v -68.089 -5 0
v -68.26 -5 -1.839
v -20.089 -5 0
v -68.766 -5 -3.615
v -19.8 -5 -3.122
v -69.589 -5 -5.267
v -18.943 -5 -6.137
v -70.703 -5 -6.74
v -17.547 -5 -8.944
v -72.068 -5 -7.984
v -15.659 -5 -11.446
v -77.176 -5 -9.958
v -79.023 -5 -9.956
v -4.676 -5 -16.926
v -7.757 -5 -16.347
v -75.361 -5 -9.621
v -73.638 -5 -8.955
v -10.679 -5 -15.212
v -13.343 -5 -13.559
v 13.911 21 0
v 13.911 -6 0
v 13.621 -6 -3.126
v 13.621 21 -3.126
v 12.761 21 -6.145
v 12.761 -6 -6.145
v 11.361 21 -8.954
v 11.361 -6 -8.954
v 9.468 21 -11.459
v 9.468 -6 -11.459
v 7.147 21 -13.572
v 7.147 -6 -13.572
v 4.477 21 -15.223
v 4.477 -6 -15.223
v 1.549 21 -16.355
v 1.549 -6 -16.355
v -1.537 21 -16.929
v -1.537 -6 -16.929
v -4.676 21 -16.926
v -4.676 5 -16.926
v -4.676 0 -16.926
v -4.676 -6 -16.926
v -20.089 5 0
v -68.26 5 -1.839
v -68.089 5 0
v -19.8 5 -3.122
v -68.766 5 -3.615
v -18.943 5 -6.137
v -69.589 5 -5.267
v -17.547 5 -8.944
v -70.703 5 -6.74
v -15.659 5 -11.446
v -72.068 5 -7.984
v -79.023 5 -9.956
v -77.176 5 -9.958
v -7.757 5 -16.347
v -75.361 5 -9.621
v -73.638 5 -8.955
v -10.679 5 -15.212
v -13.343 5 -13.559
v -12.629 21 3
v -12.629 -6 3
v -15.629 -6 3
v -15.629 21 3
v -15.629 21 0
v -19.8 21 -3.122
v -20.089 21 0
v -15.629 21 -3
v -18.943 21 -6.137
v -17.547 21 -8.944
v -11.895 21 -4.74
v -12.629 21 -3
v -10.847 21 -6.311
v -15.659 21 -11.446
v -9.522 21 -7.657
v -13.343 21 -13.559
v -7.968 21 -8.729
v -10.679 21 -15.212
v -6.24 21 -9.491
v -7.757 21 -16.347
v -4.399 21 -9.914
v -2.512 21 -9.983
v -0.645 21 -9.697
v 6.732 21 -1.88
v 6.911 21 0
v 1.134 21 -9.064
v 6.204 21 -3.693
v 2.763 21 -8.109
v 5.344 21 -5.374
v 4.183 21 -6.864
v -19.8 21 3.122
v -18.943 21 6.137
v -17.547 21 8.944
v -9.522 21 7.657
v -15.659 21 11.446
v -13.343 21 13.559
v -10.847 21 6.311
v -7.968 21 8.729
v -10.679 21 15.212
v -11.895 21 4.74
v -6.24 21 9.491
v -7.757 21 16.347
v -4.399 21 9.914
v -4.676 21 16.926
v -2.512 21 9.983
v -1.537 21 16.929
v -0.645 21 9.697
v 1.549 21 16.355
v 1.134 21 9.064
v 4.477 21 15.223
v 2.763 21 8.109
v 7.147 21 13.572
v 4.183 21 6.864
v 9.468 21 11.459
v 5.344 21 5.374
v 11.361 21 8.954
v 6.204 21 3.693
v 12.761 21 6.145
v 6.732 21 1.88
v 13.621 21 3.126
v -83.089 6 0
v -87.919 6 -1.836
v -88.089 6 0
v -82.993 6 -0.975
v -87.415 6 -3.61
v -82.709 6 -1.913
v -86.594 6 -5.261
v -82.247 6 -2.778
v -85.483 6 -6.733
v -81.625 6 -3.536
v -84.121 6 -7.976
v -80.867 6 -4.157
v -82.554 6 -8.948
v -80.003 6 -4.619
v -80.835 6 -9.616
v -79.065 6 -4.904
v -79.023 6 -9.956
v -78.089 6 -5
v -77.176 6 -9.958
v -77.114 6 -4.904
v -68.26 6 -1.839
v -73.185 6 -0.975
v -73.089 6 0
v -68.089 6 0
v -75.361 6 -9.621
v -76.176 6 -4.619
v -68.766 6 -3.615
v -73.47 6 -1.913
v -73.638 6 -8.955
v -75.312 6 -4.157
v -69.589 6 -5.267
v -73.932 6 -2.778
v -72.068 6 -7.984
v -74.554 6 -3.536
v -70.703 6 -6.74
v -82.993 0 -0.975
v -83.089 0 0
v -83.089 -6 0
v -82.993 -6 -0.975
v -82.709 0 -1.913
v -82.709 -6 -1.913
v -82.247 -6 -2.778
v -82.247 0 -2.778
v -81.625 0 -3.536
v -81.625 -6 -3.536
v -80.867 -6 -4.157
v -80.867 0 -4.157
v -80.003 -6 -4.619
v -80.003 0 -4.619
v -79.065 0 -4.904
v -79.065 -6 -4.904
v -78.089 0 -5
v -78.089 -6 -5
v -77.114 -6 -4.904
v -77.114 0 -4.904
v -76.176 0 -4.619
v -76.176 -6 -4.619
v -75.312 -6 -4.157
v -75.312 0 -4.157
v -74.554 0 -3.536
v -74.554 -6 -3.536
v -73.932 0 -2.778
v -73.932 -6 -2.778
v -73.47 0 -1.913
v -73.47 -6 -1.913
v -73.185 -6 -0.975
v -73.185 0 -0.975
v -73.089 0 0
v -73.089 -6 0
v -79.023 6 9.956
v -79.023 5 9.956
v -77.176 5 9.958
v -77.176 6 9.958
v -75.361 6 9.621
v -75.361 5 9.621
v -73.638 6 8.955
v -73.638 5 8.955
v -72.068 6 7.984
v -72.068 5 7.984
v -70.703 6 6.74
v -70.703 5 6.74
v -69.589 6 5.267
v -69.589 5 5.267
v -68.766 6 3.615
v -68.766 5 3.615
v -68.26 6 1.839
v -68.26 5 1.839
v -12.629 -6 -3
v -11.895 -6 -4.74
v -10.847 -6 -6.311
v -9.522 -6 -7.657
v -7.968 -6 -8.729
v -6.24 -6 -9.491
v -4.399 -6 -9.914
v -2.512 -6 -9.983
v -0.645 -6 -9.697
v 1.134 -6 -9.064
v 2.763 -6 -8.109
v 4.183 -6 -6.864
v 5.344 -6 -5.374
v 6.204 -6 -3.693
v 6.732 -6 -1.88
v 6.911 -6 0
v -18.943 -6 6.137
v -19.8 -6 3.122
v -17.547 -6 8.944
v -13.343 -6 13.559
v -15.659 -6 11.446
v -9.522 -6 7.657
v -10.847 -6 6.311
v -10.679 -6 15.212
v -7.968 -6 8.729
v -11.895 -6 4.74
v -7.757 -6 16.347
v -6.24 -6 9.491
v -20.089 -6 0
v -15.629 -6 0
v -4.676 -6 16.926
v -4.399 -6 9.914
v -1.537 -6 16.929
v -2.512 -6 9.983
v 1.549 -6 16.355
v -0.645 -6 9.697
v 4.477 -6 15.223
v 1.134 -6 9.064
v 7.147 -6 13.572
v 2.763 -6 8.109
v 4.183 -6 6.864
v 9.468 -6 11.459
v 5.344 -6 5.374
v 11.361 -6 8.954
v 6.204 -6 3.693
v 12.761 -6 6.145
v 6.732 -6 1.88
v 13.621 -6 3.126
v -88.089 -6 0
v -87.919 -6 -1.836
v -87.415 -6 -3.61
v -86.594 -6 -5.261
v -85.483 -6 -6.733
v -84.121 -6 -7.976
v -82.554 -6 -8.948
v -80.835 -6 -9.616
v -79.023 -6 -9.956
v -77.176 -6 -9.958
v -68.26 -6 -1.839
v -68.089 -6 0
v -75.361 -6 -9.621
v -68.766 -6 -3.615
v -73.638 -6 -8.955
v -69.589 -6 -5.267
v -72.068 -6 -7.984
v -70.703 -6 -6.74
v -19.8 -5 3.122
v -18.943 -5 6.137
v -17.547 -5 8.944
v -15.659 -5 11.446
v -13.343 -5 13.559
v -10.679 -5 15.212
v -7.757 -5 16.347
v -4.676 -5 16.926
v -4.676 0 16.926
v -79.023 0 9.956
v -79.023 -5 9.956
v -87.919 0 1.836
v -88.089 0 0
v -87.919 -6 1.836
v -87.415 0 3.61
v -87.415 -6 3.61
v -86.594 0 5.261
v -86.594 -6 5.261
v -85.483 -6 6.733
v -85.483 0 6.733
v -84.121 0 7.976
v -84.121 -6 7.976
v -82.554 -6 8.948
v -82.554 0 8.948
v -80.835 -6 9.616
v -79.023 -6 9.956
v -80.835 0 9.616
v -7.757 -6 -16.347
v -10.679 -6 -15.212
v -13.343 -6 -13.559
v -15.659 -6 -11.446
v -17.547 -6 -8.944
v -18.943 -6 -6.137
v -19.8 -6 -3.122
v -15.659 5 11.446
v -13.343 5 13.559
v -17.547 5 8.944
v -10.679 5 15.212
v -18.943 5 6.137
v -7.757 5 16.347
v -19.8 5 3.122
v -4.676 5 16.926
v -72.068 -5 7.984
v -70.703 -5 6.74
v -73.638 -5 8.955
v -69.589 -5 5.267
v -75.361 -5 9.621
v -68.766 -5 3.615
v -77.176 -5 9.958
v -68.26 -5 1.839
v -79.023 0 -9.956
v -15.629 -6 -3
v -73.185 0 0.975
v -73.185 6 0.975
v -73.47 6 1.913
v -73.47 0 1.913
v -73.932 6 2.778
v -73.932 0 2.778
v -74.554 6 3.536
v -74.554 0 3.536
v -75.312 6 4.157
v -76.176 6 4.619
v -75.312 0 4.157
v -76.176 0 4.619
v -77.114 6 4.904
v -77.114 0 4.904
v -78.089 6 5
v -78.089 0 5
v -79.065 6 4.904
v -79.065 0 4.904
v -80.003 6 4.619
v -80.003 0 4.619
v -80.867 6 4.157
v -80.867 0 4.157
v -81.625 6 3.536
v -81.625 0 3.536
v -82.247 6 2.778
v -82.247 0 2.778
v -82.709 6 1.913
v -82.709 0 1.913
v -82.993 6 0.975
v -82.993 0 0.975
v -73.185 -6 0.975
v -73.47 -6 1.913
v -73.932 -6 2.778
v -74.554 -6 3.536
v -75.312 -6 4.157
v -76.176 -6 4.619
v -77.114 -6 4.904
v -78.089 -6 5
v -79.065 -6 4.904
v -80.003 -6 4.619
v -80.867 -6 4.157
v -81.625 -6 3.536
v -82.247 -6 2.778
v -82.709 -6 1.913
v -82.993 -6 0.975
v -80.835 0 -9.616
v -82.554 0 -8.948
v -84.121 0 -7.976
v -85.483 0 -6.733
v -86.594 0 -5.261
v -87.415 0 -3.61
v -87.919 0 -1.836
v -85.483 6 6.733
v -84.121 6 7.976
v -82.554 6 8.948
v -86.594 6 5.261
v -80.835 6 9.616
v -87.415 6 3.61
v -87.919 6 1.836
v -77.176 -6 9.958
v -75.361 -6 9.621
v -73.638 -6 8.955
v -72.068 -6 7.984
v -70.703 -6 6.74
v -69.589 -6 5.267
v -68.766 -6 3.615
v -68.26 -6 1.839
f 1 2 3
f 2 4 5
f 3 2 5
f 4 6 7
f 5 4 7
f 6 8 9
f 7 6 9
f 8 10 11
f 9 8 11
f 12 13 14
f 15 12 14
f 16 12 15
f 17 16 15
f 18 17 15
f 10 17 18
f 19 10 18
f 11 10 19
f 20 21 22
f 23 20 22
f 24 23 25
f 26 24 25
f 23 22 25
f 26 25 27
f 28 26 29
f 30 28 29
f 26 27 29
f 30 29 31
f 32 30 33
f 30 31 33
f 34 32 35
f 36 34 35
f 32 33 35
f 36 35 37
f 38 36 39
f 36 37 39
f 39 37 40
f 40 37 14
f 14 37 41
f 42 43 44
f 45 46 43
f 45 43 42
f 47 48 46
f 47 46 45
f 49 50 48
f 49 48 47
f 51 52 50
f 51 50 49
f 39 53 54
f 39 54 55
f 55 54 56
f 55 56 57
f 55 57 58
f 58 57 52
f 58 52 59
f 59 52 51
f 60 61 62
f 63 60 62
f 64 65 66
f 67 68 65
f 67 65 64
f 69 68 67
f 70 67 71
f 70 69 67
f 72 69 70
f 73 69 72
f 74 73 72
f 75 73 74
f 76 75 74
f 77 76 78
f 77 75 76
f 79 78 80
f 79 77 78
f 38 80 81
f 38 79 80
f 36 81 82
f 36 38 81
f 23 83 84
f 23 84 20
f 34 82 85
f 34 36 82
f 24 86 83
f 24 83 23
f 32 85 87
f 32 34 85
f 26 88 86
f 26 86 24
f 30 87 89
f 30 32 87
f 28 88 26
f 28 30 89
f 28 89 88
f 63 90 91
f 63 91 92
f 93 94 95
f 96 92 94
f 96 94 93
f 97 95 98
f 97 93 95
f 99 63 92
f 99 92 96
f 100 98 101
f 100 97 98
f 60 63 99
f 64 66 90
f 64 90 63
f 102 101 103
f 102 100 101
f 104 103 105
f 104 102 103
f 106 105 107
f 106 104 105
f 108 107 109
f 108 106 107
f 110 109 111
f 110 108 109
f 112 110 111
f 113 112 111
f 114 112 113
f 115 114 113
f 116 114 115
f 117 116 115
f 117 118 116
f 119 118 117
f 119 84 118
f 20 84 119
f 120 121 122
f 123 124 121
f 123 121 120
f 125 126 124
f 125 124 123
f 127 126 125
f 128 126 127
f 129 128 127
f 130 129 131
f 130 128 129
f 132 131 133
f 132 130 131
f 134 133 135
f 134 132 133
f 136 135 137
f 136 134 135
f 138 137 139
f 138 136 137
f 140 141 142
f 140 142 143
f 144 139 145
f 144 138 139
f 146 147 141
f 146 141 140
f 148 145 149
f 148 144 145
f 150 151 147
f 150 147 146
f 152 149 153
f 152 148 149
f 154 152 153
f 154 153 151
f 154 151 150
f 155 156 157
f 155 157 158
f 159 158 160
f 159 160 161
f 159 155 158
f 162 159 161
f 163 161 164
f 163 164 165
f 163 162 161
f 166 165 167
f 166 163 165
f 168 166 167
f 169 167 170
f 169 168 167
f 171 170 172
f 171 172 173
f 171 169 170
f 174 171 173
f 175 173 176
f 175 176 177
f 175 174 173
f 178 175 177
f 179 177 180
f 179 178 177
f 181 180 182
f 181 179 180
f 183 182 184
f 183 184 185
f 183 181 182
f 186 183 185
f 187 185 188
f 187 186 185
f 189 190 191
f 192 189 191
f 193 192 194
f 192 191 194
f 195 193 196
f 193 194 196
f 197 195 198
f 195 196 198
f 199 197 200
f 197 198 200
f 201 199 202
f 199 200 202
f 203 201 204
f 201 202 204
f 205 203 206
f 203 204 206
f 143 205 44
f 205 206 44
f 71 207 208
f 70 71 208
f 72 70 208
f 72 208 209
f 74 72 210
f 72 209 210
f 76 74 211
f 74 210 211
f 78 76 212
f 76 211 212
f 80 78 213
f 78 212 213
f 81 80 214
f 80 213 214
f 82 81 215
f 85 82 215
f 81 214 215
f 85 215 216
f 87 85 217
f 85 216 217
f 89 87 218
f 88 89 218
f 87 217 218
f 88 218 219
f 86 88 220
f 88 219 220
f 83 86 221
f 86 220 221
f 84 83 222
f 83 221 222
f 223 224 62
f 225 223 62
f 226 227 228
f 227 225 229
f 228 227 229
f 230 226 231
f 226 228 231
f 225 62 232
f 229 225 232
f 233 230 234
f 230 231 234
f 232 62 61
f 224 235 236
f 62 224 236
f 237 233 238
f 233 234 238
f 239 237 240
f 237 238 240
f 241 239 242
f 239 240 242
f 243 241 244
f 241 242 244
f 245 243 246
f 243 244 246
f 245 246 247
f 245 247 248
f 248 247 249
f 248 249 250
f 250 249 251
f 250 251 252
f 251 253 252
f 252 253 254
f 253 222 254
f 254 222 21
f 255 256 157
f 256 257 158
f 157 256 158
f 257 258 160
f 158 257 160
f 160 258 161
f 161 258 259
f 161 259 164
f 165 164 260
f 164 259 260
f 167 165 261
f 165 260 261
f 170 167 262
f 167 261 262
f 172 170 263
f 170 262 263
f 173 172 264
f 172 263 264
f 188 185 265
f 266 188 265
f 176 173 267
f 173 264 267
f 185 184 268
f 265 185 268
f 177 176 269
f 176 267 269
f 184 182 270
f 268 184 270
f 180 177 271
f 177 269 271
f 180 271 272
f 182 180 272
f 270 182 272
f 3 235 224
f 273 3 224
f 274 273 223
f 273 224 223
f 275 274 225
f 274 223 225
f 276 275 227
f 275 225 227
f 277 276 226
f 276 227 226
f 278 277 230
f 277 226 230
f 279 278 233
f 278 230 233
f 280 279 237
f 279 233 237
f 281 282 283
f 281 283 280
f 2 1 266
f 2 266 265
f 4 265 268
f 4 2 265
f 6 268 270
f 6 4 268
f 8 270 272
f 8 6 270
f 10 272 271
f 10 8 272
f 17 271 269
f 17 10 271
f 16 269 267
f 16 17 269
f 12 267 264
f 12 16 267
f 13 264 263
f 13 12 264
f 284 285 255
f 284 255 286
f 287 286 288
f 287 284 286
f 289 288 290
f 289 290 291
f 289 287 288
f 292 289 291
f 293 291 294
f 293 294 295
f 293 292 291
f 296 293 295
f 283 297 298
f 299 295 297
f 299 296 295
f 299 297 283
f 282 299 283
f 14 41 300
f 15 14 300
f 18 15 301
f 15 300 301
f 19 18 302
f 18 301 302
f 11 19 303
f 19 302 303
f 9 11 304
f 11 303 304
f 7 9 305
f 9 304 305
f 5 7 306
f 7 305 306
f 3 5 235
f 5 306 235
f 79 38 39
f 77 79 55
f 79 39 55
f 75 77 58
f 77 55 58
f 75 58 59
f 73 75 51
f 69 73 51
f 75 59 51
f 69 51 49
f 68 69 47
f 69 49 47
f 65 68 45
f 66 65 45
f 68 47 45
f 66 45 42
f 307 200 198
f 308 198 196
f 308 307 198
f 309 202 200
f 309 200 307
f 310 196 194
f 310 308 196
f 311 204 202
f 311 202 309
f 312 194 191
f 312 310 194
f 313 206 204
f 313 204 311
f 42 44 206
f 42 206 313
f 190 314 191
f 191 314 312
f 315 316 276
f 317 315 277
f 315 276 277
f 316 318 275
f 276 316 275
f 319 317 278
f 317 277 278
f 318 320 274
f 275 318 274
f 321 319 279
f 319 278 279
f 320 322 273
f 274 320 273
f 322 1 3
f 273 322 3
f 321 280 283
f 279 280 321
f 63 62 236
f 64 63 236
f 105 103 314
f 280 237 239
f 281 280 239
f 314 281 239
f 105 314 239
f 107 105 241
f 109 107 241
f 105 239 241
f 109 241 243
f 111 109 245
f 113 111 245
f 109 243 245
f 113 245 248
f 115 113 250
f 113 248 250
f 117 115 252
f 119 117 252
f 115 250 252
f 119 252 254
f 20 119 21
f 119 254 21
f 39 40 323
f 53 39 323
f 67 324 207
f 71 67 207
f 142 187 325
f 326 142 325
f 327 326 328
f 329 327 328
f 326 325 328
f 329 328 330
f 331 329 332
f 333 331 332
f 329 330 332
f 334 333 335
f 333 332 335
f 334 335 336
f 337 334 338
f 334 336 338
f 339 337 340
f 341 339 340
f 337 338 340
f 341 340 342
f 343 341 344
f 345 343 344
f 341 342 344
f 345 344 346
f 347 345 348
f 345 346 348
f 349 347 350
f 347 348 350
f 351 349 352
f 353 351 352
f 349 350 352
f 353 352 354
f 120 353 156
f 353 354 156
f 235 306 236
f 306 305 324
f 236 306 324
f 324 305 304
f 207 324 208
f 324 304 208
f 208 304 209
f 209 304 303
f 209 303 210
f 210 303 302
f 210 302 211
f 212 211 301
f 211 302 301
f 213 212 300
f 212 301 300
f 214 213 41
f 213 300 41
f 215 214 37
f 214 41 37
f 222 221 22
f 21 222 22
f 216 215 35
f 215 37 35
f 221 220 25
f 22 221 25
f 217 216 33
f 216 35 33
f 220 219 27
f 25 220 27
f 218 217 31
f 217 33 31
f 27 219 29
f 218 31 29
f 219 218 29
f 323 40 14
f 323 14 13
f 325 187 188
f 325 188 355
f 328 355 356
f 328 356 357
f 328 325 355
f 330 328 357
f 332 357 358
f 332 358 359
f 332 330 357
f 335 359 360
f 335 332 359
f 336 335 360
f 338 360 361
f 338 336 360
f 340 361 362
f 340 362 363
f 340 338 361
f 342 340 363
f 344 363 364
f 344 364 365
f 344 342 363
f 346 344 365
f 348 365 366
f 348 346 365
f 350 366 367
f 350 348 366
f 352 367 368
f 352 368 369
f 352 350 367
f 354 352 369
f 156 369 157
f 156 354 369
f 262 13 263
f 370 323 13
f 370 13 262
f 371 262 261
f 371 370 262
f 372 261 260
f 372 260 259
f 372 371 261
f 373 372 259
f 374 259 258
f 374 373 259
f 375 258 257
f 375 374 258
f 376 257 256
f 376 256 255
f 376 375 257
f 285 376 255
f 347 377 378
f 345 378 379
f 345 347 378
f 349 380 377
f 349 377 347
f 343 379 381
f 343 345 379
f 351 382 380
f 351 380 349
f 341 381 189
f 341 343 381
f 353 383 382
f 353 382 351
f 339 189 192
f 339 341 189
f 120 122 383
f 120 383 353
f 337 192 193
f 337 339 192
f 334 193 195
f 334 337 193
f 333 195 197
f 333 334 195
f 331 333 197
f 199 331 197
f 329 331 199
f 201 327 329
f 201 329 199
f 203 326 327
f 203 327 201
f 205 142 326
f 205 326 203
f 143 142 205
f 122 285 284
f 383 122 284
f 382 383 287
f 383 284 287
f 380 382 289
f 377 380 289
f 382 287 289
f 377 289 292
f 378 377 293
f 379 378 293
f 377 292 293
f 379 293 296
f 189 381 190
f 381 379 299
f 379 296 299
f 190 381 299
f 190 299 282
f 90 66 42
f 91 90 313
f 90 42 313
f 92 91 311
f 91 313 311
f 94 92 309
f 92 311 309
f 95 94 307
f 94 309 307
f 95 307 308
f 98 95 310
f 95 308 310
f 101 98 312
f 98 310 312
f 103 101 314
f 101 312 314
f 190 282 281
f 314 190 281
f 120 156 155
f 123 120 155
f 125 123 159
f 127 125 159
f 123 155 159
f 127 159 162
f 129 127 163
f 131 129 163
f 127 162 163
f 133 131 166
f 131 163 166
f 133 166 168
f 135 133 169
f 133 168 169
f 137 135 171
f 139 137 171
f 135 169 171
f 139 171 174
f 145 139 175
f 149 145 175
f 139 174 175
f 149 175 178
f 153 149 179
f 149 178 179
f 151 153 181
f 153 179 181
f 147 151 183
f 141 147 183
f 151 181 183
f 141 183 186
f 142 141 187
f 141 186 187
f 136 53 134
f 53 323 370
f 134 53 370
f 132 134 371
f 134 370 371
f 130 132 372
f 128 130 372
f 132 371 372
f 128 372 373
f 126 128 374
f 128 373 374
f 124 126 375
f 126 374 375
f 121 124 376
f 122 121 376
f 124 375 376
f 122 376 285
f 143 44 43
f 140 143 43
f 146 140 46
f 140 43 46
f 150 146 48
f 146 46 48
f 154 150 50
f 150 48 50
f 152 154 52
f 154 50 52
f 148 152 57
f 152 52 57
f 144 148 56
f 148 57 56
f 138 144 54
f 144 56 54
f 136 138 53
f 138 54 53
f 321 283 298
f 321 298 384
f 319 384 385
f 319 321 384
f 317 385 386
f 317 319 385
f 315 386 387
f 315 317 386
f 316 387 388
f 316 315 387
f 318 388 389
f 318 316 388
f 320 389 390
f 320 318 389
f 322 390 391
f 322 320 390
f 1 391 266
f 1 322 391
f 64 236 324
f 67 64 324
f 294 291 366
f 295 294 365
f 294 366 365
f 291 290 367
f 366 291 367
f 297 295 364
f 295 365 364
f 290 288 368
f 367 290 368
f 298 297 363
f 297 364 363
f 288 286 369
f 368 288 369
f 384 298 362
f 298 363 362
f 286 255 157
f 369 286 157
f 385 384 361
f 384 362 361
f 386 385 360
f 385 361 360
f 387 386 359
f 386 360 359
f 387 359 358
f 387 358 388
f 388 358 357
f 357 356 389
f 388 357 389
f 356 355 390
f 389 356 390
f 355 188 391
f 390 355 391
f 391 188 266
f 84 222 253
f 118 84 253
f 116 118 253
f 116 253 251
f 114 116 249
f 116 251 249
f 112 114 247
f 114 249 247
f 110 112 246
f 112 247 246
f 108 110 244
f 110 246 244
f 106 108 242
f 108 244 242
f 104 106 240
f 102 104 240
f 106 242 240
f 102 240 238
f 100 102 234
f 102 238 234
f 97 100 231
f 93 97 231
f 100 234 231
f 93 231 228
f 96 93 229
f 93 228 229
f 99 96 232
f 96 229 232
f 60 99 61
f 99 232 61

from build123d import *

# Parameters (mm, degrees)
SCHIZZO1_R                        = 10
SCHIZZO1_R_2                      = 5
ESTRUSIONE_ESTRUSIONE1_DEPTH      = 6
ESTRUSIONE_ESTRUSIONE2_DEPTH      = 5
ESTRUSIONE_ESTRUSIONE3_DEPTH      = 21
ESTRUSIONE_ESTRUSIONE3_DEPTH_BACK = 6
SCHIZZO1_4_R                      = 17


with BuildPart() as part:
    # Schizzo1 → Estrusione-Estrusione1 (new, symmetric)
    with BuildSketch(Plane(origin=(0, 0, 0), x_dir=(1, 0, 0), z_dir=(0, 1, 0))):
        with Locations((-78.089397902, 0)):
            Circle(SCHIZZO1_R)
        with Locations((-78.089397902, 0)):
            Circle(SCHIZZO1_R_2, mode=Mode.SUBTRACT)
    extrude(amount=ESTRUSIONE_ESTRUSIONE1_DEPTH, both=True)

    # Schizzo1<3> → Estrusione-Estrusione2 (add, symmetric)
    with BuildSketch(Plane(origin=(0, 0, 0), x_dir=(1, 0, 0), z_dir=(0, 1, 0))):
        with BuildLine():
            ThreePointArc((-79.022731235, 9.956349175), (-68.089397902, 0), (-79.022731235, -9.956349175))
            Line((-79.022731235, -9.956349175), (-4.676064568, -16.925793597))
            ThreePointArc((-4.676064568, -16.925793597), (-20.089397902, 0), (-4.676064568, 16.925793597))
            Line((-4.676064568, 16.925793597), (-79.022731235, 9.956349175))
        make_face()
    extrude(amount=ESTRUSIONE_ESTRUSIONE2_DEPTH, both=True)

    # Schizzo1<4> → Estrusione-Estrusione3 (add, two sides: drawn at the far end of the back side and taken through both)
    with BuildSketch(Plane(origin=(0, 0, 0), x_dir=(1, 0, 0), z_dir=(0, 1, 0)).offset(-ESTRUSIONE_ESTRUSIONE3_DEPTH_BACK)):
        with Locations((-3.089397902, 0)):
            Circle(SCHIZZO1_4_R)
        with BuildLine():
            ThreePointArc((-12.628789916, 3), (6.910602098, 0), (-12.628789916, -3))
            Line((-12.628789916, -3), (-15.628789916, -3))
            Line((-15.628789916, -3), (-15.628789916, 3))
            Line((-15.628789916, 3), (-12.628789916, 3))
        make_face(mode=Mode.SUBTRACT)
    extrude(amount=ESTRUSIONE_ESTRUSIONE3_DEPTH + ESTRUSIONE_ESTRUSIONE3_DEPTH_BACK)


solid = part.part
